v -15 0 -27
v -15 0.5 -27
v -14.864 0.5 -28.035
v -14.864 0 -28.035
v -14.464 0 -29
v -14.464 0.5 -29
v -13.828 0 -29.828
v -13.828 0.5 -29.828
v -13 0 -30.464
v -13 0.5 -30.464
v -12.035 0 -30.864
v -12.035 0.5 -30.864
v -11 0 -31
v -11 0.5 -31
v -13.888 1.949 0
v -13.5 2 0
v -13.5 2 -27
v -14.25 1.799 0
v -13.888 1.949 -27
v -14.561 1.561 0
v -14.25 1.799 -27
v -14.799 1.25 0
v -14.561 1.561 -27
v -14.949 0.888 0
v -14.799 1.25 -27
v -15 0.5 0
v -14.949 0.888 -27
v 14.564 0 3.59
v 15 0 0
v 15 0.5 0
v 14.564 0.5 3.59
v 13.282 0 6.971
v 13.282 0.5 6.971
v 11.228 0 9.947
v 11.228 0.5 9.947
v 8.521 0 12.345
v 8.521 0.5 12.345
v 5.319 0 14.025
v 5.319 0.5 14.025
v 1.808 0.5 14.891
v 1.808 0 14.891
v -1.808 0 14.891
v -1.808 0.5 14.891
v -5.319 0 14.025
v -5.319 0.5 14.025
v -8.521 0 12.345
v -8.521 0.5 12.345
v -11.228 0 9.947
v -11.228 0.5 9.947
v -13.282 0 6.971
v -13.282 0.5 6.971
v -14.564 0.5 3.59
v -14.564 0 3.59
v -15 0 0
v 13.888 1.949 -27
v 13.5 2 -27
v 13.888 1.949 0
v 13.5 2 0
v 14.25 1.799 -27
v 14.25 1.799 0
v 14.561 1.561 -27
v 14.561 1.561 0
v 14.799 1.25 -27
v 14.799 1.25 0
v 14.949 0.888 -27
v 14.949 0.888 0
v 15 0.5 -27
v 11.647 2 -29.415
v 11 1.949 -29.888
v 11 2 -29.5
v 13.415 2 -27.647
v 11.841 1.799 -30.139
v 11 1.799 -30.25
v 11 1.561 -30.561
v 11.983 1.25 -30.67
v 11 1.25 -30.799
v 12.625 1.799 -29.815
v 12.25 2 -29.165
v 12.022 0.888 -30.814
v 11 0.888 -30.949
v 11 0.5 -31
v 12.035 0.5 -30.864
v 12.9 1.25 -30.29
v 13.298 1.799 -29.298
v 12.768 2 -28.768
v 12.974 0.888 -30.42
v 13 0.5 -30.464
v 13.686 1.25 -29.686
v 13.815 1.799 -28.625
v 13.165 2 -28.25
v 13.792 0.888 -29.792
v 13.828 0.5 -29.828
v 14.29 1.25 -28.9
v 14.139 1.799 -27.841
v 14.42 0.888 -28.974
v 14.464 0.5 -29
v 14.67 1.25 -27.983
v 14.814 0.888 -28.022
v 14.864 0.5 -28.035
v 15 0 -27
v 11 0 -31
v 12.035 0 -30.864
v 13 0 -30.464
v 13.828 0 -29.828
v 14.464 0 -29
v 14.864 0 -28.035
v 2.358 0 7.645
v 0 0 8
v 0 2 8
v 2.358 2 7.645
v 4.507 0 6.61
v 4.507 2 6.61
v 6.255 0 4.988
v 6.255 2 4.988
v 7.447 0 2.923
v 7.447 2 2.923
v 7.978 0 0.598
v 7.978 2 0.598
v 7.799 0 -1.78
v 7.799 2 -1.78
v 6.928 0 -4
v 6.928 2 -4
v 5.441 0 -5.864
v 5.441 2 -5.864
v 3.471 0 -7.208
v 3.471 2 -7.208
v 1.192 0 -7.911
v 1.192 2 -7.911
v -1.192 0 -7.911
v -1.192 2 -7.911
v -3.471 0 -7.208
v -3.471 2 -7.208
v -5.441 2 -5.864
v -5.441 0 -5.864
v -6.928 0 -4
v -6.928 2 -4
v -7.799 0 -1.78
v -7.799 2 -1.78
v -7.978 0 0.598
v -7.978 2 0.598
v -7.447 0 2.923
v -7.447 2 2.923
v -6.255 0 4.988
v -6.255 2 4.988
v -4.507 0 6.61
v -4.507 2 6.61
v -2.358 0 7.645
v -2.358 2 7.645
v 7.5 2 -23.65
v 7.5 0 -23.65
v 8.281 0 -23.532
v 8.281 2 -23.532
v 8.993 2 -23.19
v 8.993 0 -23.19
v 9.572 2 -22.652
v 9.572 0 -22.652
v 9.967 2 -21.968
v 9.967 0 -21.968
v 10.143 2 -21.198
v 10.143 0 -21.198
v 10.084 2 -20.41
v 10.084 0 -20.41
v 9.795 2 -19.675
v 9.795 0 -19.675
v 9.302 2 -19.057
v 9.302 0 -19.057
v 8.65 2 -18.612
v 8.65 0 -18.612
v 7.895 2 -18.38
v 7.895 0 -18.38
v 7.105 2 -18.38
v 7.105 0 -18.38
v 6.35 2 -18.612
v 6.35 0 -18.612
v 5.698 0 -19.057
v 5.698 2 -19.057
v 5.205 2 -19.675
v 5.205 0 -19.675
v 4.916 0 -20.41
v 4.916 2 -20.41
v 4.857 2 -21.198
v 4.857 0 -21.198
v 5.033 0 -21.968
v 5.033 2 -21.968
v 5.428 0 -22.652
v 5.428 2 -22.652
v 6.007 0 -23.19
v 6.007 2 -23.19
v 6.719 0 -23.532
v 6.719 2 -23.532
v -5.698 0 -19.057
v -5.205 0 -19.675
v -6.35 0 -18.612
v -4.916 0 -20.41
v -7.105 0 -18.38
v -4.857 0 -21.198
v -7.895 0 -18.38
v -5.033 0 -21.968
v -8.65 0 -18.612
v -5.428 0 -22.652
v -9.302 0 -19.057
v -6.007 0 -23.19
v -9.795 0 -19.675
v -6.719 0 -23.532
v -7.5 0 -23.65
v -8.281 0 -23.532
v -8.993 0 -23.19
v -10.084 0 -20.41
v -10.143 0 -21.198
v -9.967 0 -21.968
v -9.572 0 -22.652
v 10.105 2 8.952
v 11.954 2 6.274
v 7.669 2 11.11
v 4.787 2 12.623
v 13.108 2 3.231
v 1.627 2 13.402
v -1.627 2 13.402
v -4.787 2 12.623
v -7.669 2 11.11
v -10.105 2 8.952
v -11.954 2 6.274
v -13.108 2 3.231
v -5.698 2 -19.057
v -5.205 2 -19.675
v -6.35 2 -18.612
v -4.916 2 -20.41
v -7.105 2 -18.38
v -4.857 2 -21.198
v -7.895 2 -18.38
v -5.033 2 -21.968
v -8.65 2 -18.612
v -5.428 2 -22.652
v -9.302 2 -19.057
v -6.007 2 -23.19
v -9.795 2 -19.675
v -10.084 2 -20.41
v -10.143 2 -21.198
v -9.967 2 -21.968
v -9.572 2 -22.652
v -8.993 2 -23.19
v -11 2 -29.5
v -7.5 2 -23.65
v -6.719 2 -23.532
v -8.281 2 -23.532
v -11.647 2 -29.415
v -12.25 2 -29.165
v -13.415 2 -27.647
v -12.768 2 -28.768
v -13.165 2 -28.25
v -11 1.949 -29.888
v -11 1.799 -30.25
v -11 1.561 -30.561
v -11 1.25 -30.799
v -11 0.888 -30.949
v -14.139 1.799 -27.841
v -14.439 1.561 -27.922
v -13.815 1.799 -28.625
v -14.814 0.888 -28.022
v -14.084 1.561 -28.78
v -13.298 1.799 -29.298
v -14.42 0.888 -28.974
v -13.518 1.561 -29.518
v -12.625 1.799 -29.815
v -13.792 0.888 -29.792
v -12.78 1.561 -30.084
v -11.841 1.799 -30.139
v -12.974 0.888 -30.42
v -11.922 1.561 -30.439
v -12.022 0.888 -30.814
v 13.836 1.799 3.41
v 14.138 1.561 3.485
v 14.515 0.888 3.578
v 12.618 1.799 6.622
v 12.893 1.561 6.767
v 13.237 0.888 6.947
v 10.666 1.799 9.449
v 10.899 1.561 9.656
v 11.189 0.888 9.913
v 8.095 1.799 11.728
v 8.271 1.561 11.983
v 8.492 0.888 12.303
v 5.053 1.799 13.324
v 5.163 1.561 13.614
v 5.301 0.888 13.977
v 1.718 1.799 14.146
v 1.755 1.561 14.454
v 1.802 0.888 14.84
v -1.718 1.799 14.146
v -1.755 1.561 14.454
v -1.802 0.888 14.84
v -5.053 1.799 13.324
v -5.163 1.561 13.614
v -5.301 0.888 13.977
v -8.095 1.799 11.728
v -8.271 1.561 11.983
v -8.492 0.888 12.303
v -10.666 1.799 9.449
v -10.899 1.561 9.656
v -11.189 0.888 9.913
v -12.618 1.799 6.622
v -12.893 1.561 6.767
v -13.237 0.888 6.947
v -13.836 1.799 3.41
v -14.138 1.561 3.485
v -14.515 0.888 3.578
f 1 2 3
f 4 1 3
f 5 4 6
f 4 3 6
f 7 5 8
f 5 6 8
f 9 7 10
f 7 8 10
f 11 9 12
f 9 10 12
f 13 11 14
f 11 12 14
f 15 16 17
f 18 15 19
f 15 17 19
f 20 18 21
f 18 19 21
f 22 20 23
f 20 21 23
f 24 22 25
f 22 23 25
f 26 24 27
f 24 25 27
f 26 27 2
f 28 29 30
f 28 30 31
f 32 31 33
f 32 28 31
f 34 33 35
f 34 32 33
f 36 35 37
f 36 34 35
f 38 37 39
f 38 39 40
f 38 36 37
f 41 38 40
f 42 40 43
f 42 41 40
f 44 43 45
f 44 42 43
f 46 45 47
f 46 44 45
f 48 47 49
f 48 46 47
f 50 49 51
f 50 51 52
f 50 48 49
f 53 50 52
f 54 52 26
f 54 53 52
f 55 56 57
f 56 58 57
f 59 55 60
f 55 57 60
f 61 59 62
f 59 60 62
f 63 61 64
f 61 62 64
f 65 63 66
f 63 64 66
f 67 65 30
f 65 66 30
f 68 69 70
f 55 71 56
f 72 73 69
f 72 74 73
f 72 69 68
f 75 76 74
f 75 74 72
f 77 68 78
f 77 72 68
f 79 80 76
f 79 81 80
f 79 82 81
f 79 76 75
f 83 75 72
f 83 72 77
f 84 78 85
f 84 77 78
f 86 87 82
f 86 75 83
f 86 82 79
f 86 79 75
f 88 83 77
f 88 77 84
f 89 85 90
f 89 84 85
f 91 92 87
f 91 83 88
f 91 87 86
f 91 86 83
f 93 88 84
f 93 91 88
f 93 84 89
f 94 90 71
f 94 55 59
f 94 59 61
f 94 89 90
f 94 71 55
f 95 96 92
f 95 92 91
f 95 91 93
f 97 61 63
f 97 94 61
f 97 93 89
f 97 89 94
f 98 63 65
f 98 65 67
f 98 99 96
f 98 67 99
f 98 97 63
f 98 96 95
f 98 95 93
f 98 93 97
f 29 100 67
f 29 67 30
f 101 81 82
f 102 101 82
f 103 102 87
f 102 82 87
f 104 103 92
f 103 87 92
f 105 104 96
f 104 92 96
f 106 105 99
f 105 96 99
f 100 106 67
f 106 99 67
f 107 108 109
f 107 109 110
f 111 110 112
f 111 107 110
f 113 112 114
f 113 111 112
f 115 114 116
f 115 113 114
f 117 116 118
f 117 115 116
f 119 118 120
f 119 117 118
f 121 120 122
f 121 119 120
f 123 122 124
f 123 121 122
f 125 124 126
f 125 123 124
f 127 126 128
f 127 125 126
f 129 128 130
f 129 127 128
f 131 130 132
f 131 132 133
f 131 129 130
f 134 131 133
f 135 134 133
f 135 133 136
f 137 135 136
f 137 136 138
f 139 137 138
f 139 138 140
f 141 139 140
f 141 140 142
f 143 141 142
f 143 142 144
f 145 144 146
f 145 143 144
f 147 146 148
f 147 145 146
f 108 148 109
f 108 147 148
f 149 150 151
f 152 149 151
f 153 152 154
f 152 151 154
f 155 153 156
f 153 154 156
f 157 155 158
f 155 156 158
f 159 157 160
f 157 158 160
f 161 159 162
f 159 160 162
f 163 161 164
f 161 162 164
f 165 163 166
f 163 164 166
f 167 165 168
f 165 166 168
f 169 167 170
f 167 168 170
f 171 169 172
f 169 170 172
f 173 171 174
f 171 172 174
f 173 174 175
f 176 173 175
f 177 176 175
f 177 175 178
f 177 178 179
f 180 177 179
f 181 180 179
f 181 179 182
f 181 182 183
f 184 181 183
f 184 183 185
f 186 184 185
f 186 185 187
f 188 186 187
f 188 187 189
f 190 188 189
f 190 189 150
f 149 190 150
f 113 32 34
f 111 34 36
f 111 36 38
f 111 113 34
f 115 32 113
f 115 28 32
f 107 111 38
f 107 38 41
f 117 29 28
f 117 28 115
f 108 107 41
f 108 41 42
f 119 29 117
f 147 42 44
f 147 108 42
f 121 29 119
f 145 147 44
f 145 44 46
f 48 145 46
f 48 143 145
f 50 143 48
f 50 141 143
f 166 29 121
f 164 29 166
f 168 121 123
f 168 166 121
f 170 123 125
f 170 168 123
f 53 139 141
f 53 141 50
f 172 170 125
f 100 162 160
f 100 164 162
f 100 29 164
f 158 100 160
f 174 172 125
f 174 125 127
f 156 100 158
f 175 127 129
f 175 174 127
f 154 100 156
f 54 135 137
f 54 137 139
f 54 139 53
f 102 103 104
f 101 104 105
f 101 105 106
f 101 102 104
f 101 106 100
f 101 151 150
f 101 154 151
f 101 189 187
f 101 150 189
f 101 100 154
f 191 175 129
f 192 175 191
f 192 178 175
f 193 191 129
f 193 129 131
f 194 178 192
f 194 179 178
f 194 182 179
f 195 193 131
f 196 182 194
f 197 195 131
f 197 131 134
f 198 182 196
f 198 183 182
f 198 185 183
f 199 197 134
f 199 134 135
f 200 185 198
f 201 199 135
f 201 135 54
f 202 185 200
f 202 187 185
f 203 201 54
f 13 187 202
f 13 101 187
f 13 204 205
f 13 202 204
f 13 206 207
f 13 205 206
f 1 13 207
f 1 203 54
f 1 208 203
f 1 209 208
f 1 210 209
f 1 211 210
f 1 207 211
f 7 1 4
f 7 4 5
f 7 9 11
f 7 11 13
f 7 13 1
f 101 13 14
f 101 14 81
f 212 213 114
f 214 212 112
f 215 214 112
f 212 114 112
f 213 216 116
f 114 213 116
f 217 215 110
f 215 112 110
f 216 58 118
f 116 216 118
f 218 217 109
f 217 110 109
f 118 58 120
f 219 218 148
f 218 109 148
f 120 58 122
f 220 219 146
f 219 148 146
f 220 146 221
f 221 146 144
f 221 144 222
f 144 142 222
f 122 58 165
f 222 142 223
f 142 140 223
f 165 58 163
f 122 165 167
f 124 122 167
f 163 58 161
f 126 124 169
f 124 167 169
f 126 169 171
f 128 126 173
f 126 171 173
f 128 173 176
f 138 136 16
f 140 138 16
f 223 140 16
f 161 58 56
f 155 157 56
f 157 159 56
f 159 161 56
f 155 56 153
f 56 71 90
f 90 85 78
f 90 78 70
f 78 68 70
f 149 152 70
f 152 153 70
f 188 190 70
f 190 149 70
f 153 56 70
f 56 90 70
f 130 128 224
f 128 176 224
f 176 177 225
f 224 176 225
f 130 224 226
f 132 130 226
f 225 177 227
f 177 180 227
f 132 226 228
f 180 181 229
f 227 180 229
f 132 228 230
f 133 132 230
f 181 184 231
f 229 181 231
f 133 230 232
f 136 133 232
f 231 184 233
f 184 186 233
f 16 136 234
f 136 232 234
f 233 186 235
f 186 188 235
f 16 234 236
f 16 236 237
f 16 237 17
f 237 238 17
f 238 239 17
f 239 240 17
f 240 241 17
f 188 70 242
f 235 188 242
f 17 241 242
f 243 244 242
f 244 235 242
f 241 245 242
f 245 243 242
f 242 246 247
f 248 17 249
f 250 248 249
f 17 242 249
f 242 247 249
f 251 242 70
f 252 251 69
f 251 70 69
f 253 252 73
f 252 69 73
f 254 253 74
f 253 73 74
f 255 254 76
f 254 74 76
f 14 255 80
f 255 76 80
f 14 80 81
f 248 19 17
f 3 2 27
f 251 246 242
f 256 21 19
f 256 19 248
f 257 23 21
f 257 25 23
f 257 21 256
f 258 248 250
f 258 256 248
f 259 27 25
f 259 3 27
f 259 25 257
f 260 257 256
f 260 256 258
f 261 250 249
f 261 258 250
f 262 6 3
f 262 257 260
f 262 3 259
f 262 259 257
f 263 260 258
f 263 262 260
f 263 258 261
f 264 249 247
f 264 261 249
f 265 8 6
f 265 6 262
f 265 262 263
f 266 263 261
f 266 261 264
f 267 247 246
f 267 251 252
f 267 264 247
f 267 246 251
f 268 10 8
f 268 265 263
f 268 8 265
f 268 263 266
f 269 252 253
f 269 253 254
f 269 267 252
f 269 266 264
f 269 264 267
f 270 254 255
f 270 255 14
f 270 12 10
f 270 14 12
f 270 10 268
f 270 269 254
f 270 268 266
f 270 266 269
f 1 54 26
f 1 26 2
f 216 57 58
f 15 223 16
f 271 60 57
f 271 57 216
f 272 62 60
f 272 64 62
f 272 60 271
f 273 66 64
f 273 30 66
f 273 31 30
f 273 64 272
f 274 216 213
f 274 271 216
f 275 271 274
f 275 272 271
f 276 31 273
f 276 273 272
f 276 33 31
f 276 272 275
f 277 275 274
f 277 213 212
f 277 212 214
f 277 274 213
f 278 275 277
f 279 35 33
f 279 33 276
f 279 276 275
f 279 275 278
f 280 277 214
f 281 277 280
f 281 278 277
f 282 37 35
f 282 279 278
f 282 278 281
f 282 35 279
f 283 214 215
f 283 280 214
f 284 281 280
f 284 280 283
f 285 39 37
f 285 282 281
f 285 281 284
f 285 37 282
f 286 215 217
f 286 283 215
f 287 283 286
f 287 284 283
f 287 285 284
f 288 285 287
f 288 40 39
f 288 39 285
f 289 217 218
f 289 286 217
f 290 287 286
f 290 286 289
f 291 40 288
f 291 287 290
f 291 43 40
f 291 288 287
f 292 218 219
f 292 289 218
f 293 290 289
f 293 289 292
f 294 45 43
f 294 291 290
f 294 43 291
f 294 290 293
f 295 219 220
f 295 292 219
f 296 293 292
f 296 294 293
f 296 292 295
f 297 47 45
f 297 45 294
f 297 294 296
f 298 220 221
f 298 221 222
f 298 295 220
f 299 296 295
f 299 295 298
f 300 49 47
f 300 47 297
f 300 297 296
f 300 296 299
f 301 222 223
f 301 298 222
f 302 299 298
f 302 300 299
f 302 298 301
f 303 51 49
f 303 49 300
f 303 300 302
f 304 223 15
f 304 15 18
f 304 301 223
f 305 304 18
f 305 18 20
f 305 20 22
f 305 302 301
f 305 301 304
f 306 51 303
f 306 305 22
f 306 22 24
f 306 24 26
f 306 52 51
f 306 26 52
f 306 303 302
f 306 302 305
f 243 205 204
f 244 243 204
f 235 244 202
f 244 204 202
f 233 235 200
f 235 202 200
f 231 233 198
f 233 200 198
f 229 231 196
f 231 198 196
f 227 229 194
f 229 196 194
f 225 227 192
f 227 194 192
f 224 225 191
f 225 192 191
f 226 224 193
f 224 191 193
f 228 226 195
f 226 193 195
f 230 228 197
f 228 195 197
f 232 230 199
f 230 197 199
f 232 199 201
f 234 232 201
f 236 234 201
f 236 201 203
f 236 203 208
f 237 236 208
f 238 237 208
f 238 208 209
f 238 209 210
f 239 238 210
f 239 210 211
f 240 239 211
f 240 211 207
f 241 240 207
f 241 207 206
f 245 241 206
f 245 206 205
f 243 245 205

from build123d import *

# Parameters (mm, degrees)
SKETCH1_R            = 8
BOSS_EXTRUDE1_DEPTH  = 2
M5_CLEARANCE_HOLE1_D = 5.3
FILLET1_R            = 4
FILLET2_R            = 1.5


with BuildPart() as part:
    # Sketch1 → Boss-Extrude1 (new body)
    with BuildSketch(Plane(origin=(0, 0, 0), x_dir=(1, 0, 0), z_dir=(0, 1, 0))):
        with BuildLine():
            Line((-15, 0), (-15, 31))
            Line((-15, 31), (15, 31))
            Line((15, 31), (15, 0))
            ThreePointArc((15, 0), (0, -15), (-15, 0))
        make_face()
        with Locations(Location((0, 0, 0), (0, 0, 270))):
            Circle(SKETCH1_R, mode=Mode.SUBTRACT)
    extrude(amount=BOSS_EXTRUDE1_DEPTH)

    # M5 Clearance Hole1 (through all)
    with Locations(Plane(origin=(-7.5, 2, -21), x_dir=(0, 0, 1), z_dir=(0, 1, 0))):
        with Locations((0, 0), (0, 15)):
            Hole(M5_CLEARANCE_HOLE1_D / 2)

    # Fillet1
    fillet1_edges = [part.edges().sort_by_distance(p)[0] for p in [
        (-15, 1, -31),
        (15, 1, -31),
    ]]
    fillet(fillet1_edges, radius=FILLET1_R)

    # Fillet2
    fillet2_edges = [part.edges().sort_by_distance(p)[0] for p in [
        (15, 2, -13.5),
        (-15, 2, -13.5),
        (0, 2, -31),
        (-13.828427125, 2, -29.828427125),
        (13.828427125, 2, -29.828427125),
        (0, 2, 15),
    ]]
    fillet(fillet2_edges, radius=FILLET2_R)


solid = part.part
